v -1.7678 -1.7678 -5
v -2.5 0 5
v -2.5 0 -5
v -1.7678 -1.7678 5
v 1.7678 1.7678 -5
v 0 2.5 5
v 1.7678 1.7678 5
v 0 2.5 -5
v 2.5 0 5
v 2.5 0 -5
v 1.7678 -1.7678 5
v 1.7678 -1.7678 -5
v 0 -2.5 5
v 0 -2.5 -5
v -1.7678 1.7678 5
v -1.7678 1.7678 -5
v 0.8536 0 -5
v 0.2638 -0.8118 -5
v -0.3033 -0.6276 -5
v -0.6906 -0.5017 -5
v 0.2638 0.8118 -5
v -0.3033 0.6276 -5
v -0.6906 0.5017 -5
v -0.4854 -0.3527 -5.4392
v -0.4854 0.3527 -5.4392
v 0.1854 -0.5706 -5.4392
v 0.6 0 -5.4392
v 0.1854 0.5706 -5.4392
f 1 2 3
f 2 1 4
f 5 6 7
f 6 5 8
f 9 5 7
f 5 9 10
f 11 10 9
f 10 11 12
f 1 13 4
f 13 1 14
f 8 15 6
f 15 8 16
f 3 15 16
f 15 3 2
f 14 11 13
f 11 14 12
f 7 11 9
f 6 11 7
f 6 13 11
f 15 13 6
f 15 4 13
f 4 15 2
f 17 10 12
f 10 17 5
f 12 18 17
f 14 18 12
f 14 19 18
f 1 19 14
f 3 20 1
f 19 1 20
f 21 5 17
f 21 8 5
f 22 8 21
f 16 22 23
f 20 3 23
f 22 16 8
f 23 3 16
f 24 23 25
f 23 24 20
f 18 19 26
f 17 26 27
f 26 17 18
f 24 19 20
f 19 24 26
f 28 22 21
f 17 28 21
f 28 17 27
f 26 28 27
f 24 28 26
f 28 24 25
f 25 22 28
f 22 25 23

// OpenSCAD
// Parameters
length_mm = 10; //[5:30:1]
tolerance_mm = 0.2; //[0.05:0.5:0.05]
thread_major_d_mm = 5; //[4:6:0.1]
thread_pitch_mm = 0.8; //[0.5:1.2:0.05]
thread_depth_mm = 0.35; //[0.2:0.6:0.05]
hex_af_mm = 2.5; //[2:3:0.1]
socket_depth_mm = 2.5; //[1.5:4:0.1]
cup_depth_mm = 0.6; //[0.2:1.5:0.05]
cup_radius_mm = 1.2; //[0.6:2.2:0.05]
tip_style_cup = 1; //[0:1:1]
overlap_mm = 0.8; //[0.5:2:0.1]

// Screw - complete geometry
module screw() {
  color("DimGray") {
    // Grub screw body
    cylinder(r=thread_major_d_mm/2, h=length_mm, center=true);

    // Simplified threaded shaft
    scale([(thread_major_d_mm/2 - thread_depth_mm)/(thread_major_d_mm/2),
           (thread_major_d_mm/2 - thread_depth_mm)/(thread_major_d_mm/2), 1])
      cylinder(r=thread_major_d_mm/2, h=length_mm, center=true);

    // Hex socket drive
    difference() {
      cylinder(r=thread_major_d_mm/2, h=length_mm, center=true);
      translate([0, 0, length_mm/2 - socket_depth_mm/2])
        cylinder(r=(hex_af_mm + tolerance_mm)/cos(30)/2, h=socket_depth_mm + overlap_mm, center=true);
    }

    // Tip profile (cup or flat)
    if (tip_style_cup == 1) {
      translate([0, 0, -length_mm/2 + cup_radius_mm - cup_depth_mm])
        sphere(r=cup_radius_mm, center=true);
    }
  }
}

// Assembly
module assembly() {
  screw();
}

assembly();
